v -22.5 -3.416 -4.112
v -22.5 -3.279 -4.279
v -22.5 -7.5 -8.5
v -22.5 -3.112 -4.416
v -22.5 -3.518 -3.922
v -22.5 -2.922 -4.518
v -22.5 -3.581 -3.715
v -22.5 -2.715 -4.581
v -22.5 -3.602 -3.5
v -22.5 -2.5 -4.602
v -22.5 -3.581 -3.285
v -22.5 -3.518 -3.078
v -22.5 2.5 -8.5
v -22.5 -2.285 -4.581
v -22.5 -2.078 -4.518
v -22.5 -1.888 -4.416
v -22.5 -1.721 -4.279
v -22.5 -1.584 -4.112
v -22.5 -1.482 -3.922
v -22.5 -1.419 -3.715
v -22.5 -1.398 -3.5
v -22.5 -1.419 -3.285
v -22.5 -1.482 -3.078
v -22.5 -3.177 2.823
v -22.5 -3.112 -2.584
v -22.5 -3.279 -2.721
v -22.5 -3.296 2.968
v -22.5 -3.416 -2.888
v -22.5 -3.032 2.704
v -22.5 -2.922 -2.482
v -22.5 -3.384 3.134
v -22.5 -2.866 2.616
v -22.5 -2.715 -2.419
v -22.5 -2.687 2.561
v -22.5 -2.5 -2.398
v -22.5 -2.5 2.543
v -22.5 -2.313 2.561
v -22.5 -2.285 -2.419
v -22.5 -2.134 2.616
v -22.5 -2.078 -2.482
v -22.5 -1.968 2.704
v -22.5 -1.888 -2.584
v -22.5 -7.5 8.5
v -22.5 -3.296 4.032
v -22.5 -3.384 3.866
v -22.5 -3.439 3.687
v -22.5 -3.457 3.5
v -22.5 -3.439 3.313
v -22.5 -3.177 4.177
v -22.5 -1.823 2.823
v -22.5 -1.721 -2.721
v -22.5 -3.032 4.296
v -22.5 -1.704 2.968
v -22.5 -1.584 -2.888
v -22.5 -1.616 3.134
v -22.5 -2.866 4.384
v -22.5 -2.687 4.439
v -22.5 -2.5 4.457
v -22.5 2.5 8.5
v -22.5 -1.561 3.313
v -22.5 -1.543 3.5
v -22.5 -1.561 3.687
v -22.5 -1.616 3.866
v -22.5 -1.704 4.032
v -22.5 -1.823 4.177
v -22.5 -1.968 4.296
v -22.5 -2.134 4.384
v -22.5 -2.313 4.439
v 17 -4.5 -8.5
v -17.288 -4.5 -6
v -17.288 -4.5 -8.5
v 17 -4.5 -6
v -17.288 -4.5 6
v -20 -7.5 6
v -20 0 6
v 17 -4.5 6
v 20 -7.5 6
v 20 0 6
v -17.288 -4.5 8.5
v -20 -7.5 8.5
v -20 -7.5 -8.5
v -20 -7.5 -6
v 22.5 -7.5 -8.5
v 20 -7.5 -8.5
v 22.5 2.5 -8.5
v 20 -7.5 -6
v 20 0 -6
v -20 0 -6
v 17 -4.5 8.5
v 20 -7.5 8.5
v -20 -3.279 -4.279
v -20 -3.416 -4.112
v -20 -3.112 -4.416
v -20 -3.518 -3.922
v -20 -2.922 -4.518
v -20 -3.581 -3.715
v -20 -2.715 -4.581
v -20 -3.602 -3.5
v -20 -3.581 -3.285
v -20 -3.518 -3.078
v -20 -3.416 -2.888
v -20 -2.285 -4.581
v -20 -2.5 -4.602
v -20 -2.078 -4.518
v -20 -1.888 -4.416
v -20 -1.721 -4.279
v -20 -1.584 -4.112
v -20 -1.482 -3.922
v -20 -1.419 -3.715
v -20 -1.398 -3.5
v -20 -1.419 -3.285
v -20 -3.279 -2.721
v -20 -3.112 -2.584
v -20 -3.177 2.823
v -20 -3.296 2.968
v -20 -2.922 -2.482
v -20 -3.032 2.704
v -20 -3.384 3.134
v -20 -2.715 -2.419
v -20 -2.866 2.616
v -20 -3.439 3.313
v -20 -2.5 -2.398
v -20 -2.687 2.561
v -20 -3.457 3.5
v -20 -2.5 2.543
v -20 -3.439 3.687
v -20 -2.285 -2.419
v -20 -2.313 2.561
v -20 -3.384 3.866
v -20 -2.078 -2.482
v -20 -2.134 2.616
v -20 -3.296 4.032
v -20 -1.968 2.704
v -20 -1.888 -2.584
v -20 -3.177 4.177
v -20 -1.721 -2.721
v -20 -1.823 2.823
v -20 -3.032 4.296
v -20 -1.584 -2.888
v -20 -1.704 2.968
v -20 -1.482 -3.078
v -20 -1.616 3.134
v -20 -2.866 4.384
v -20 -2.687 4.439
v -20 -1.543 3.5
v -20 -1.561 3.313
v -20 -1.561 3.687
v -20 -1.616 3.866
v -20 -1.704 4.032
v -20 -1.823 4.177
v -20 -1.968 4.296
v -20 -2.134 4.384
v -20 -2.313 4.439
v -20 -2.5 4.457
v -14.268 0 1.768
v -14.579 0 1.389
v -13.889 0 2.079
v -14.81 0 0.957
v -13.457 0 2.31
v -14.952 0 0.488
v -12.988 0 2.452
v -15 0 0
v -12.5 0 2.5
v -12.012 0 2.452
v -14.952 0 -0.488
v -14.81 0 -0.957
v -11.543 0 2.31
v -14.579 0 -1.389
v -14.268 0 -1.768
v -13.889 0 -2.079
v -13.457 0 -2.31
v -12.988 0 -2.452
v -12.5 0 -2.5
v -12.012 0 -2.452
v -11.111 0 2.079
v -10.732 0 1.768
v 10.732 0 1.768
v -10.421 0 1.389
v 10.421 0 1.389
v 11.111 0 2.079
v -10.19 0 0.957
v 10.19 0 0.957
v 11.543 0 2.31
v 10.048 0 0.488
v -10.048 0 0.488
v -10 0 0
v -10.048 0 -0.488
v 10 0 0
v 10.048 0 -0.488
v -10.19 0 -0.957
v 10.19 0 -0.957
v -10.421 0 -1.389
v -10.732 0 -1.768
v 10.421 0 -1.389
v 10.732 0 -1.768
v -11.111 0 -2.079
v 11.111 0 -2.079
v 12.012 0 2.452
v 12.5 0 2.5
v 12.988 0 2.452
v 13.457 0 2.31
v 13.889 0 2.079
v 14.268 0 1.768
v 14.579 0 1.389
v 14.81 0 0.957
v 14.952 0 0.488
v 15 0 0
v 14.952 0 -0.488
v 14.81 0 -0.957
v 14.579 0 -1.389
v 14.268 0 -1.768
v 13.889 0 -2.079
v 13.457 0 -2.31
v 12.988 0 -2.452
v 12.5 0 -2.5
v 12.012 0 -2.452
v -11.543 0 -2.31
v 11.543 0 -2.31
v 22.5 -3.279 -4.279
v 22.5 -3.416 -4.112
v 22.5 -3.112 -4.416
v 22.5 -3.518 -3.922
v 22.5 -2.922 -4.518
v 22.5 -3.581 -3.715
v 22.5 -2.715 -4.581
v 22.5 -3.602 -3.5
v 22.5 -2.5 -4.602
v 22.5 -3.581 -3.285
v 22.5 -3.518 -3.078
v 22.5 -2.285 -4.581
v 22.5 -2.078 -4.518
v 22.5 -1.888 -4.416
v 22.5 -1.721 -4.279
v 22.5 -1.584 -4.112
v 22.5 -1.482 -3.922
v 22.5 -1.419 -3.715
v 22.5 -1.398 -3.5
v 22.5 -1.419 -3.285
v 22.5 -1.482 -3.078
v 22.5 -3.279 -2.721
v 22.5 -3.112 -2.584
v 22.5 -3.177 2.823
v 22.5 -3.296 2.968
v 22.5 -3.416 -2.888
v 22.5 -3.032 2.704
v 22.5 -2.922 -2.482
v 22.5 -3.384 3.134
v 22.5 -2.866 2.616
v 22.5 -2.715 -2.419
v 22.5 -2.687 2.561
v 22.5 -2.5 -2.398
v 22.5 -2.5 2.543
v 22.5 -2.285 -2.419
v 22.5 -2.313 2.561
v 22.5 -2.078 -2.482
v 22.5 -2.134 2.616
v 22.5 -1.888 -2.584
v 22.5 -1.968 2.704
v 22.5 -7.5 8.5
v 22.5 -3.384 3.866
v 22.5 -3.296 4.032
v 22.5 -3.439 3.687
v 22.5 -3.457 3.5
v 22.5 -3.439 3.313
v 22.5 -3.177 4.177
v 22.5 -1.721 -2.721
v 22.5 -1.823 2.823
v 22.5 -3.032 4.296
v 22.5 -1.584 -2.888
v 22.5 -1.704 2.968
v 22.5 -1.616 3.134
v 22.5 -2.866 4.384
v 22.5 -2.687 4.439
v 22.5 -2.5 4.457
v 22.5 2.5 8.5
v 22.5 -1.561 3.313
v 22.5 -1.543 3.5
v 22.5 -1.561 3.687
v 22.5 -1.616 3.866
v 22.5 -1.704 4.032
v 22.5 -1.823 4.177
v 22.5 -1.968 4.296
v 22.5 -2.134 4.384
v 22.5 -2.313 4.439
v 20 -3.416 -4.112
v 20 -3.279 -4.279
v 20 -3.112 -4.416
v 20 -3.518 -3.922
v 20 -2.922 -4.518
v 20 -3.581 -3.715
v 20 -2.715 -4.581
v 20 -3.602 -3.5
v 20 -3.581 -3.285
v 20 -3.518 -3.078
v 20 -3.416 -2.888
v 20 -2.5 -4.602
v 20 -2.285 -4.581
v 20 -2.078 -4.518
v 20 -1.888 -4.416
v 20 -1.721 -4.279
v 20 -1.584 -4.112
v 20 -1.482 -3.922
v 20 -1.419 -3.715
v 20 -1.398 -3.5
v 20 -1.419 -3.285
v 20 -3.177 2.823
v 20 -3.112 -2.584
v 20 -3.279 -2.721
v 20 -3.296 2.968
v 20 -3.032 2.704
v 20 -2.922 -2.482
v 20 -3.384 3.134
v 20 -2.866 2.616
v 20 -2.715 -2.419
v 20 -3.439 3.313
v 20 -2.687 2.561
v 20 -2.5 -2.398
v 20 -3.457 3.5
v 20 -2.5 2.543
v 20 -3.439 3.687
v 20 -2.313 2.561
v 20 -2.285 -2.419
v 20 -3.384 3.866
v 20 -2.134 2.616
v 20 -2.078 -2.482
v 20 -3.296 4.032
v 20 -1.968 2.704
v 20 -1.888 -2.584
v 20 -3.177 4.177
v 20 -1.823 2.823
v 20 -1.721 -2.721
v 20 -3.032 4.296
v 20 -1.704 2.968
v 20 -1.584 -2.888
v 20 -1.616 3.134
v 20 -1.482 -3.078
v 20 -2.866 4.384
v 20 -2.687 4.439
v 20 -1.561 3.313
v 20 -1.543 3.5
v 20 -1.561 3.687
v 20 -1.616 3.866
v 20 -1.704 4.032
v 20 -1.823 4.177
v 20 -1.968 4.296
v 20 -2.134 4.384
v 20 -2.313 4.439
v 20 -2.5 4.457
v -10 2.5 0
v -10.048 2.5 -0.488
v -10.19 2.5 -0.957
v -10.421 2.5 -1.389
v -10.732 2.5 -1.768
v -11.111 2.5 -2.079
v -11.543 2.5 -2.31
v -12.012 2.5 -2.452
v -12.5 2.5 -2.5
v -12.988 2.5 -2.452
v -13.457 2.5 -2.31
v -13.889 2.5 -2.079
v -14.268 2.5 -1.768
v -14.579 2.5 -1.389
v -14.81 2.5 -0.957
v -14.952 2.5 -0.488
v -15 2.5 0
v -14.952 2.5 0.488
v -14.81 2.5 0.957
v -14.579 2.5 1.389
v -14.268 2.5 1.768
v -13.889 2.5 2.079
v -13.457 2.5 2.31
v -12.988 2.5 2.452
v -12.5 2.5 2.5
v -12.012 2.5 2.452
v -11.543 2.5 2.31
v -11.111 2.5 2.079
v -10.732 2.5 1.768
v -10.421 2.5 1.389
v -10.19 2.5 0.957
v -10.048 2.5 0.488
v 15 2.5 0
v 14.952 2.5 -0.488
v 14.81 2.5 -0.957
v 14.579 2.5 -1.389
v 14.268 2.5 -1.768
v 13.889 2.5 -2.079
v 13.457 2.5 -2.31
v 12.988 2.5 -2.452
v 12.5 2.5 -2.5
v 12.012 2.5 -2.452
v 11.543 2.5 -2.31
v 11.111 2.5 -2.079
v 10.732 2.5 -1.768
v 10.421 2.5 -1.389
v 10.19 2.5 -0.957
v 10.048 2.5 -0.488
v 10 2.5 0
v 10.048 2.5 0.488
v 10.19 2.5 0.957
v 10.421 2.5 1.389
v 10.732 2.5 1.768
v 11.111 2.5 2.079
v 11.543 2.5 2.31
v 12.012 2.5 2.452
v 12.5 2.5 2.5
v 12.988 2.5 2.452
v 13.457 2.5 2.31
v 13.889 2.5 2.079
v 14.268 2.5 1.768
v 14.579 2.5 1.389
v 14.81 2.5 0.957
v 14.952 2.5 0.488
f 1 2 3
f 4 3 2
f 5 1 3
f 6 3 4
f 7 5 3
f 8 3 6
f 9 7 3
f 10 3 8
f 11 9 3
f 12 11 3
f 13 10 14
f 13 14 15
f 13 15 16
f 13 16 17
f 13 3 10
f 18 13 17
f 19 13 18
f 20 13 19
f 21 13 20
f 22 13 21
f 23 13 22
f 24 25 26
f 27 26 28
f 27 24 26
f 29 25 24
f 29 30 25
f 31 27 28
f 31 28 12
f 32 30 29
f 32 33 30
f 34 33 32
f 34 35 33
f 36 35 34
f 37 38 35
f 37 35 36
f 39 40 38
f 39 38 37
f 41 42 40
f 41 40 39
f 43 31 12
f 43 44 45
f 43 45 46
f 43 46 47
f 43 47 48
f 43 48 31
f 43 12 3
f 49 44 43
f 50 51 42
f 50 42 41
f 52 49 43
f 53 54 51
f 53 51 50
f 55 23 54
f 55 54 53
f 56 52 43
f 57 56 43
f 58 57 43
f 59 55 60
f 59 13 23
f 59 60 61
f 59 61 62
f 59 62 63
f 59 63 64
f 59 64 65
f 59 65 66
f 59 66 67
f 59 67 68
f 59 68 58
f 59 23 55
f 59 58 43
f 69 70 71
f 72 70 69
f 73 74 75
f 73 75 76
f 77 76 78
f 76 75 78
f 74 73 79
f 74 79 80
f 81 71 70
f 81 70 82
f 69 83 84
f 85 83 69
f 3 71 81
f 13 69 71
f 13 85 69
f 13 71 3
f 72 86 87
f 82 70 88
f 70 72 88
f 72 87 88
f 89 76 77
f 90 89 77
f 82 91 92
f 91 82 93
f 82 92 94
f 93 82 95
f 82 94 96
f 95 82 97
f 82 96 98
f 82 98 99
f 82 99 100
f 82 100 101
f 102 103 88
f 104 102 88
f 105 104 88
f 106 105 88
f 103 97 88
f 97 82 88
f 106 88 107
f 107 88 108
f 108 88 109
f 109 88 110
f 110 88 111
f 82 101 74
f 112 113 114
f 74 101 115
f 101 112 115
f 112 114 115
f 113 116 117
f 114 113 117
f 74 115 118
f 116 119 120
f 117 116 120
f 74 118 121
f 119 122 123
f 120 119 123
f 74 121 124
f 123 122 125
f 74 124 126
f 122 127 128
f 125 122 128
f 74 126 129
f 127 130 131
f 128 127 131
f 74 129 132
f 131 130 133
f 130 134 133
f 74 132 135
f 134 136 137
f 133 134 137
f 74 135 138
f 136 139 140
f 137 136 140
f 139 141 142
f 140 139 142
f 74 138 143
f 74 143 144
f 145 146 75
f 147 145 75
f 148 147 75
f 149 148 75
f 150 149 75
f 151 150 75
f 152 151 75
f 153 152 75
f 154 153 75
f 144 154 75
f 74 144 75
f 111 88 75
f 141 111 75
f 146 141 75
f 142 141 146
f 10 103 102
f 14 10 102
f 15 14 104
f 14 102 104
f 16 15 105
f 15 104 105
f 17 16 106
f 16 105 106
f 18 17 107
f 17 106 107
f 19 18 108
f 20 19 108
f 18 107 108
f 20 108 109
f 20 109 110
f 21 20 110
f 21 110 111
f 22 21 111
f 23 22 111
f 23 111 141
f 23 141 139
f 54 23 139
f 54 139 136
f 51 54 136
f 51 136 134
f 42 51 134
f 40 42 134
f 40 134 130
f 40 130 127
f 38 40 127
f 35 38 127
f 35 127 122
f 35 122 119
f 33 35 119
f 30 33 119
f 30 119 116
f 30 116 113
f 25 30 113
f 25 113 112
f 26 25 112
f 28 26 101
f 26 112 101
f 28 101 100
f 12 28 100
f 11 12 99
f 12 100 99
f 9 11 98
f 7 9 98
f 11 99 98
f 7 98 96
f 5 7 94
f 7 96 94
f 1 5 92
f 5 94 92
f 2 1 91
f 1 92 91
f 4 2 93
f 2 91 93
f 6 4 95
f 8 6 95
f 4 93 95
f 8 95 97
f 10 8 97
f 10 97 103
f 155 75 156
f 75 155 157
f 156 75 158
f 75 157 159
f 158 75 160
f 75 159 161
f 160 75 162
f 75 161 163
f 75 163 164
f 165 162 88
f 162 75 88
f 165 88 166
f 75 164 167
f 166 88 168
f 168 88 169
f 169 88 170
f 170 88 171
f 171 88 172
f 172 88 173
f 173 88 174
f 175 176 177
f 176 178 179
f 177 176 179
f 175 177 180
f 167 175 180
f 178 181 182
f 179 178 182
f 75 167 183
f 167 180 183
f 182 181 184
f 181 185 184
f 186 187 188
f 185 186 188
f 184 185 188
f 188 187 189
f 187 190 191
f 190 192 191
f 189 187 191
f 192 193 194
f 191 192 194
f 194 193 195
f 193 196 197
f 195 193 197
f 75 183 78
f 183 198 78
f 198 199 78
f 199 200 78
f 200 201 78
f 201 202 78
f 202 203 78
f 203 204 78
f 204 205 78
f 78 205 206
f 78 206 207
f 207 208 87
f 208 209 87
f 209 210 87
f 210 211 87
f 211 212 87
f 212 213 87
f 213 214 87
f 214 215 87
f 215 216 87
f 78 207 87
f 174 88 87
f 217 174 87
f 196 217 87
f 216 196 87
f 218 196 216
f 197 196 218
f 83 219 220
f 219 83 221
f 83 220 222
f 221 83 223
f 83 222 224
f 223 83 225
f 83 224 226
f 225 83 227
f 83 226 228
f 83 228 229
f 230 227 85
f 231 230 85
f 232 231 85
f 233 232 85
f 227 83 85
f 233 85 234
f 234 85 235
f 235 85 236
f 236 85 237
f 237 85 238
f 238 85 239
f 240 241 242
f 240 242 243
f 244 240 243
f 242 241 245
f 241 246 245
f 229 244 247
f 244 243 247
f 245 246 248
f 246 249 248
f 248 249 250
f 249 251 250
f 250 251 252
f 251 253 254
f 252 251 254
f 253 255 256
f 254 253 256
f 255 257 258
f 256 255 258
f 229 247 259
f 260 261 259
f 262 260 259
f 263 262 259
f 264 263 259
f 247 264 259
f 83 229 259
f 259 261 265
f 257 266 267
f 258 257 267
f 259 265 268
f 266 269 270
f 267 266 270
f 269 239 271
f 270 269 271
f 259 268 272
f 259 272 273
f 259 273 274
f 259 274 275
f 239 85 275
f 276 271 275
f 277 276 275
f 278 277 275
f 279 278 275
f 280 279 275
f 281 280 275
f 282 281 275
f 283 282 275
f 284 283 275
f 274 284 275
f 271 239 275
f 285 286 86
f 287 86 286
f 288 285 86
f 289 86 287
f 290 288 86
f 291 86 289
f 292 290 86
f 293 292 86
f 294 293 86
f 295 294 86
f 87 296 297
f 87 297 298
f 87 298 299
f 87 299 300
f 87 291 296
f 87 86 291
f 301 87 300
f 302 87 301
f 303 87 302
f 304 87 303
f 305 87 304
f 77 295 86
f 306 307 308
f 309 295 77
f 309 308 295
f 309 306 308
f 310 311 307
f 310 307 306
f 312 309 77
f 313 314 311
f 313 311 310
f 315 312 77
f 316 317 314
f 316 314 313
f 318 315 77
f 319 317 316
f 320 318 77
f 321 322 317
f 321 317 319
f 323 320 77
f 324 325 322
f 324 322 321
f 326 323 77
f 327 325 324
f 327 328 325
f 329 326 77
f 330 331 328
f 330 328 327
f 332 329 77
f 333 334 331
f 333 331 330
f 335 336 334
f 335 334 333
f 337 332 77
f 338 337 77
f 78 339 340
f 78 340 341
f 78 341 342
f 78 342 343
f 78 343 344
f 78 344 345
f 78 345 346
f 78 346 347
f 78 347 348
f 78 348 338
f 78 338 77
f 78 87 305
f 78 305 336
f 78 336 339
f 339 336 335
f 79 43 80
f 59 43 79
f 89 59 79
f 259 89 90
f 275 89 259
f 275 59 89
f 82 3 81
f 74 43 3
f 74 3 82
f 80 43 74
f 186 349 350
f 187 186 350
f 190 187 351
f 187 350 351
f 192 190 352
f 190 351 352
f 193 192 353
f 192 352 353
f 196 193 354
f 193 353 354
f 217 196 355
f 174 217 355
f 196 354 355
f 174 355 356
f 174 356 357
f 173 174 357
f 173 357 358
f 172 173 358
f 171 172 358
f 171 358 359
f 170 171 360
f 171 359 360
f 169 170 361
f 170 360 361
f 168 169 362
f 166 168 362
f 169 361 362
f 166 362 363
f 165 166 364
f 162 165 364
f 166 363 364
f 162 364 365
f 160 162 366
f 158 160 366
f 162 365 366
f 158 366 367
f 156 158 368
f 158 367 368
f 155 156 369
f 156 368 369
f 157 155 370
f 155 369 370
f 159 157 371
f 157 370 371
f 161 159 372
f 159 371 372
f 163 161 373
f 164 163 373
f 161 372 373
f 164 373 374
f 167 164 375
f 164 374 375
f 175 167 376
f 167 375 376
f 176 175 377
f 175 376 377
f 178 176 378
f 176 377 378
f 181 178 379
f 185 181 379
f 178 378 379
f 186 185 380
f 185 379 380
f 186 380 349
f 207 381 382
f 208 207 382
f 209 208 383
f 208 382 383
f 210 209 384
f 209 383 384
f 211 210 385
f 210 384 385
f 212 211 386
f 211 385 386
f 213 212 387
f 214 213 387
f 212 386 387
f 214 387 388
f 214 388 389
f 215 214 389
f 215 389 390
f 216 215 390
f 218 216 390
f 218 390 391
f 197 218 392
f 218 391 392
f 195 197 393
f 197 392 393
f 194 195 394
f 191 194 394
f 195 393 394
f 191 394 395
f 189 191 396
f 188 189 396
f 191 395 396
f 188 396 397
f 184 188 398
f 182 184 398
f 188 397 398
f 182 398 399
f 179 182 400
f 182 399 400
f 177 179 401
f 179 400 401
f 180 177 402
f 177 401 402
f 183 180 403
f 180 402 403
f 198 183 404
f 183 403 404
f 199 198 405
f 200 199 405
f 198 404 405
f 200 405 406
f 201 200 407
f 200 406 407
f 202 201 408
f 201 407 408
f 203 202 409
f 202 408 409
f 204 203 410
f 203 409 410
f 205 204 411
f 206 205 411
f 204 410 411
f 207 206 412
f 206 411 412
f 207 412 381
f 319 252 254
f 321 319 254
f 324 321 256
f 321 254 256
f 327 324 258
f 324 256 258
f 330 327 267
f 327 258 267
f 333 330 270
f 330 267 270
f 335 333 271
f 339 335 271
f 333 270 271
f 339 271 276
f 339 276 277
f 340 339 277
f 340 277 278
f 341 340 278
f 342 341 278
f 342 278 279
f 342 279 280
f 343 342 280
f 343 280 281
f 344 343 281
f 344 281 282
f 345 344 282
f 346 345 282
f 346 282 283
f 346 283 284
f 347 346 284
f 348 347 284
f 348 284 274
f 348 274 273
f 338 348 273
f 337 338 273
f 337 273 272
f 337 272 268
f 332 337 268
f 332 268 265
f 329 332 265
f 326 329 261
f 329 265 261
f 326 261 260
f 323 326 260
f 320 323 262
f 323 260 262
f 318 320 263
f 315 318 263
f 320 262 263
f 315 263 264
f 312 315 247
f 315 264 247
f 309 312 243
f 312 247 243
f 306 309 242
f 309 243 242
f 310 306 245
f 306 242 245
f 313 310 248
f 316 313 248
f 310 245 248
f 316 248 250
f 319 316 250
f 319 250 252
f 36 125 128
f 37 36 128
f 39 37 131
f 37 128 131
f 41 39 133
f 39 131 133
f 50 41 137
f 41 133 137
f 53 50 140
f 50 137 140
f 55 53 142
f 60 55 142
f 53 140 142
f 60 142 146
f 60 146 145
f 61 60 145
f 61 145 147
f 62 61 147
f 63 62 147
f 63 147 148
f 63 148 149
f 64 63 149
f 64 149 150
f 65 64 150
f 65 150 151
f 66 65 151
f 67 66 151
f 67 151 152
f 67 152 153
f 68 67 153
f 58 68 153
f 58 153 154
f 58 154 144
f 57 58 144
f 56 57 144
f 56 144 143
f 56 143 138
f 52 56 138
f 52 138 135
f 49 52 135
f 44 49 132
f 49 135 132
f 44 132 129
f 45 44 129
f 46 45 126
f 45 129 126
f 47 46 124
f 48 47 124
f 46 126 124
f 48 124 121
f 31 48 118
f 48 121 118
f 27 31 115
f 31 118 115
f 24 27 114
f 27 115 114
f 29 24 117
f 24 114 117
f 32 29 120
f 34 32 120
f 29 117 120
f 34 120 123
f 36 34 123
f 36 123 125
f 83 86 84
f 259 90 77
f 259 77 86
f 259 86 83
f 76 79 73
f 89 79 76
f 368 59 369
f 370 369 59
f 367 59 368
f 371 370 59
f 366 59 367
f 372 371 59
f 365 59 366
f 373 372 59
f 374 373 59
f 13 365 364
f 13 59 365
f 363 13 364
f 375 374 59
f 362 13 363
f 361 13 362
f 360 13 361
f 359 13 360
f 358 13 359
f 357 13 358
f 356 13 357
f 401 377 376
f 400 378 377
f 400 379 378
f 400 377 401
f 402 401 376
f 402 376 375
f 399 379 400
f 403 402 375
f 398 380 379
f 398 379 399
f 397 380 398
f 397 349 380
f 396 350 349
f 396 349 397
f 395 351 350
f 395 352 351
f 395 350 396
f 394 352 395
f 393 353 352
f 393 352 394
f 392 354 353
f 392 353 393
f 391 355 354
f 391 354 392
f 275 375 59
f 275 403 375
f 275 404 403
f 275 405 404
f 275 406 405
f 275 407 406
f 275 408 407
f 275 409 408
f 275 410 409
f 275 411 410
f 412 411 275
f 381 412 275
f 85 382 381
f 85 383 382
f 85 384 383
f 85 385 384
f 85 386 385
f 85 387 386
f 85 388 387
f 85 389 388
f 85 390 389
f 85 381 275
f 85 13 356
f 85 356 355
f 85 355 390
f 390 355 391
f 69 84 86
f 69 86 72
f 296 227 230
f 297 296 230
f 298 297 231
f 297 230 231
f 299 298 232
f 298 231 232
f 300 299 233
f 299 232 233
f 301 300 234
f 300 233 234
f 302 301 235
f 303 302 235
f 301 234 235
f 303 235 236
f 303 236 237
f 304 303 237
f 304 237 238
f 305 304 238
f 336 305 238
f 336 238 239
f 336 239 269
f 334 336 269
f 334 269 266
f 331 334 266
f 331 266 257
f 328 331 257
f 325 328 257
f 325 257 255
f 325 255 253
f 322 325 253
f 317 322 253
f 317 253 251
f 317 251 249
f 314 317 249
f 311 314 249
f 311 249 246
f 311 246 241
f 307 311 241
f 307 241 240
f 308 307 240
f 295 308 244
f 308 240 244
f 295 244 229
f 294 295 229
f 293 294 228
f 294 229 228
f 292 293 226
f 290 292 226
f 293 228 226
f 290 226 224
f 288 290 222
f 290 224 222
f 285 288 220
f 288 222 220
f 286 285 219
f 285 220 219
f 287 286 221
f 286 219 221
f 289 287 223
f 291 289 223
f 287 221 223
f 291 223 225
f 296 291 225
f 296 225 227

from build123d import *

# Parameters (mm, degrees)
SKETCH1_W           = 45
SKETCH1_H           = 17
BOSS_EXTRUDE1_DEPTH = 2.5
SKETCH2_W           = 45
SKETCH2_H           = 17
SKETCH2_W_2         = 40
SKETCH2_H_2         = 12
BOSS_EXTRUDE2_DEPTH = 4.5
SKETCH3_R           = 0.957368162
SKETCH3_R_2         = 1.102212996
CUT_EXTRUDE1_DEPTH  = 46
SKETCH4_W           = 2.5
SKETCH4_H           = 17
BOSS_EXTRUDE3_DEPTH = 3
BOSS_EXTRUDE4_START = -2.5
BOSS_EXTRUDE4_DEPTH = 2.5
BOSS_EXTRUDE5_DEPTH = 2.5
SKETCH7_R           = 2.5
CUT_EXTRUDE2_DEPTH  = 2.5


with BuildPart() as part:
    # Sketch1 → Boss-Extrude1 (new body)
    with BuildSketch(Plane(origin=(0, 0, 0), x_dir=(1, 0, 0), z_dir=(0, 1, 0))):
        Rectangle(SKETCH1_W, SKETCH1_H)
    extrude(amount=BOSS_EXTRUDE1_DEPTH)

    # Sketch2 → Boss-Extrude2 (add)
    with BuildSketch(Plane.XZ):
        Rectangle(SKETCH2_W, SKETCH2_H)
        Rectangle(SKETCH2_W_2, SKETCH2_H_2, mode=Mode.SUBTRACT)
    extrude(amount=BOSS_EXTRUDE2_DEPTH)

    # Sketch3 → Cut-Extrude1 (cut, through all)
    with BuildSketch(Plane(origin=(22.5, 0, 0), x_dir=(0, 0, -1), z_dir=(1, 0, 0))):
        with Locations((-3.5, -2.5)):
            Circle(SKETCH3_R)
        with Locations((3.5, -2.5)):
            Circle(SKETCH3_R_2)
    extrude(amount=-CUT_EXTRUDE1_DEPTH, mode=Mode.SUBTRACT)

    # Sketch4 → Boss-Extrude3 (add)
    with BuildSketch(Plane.XZ.offset(4.5)):
        with Locations((-21.25, 0)):
            Rectangle(SKETCH4_W, SKETCH4_H)
        with Locations((21.25, 0)):
            Rectangle(SKETCH4_W, SKETCH4_H)
    extrude(amount=BOSS_EXTRUDE3_DEPTH)

    # Sketch5 → Boss-Extrude4 (add)
    with BuildSketch(Plane.XY.offset(8.5).offset(BOSS_EXTRUDE4_START)):
        Polygon((20, -7.5), (20, -4.5), (17, -4.5), align=None)
        Polygon((-20, -7.5), (-20, -4.5), (-17.287649909, -4.5), align=None)
    extrude(amount=BOSS_EXTRUDE4_DEPTH)

    # Sketch6 → Boss-Extrude5 (add)
    with BuildSketch(Plane(origin=(0, 0, -8.5), x_dir=(-1, 0, 0), z_dir=(0, 0, -1))):
        Polygon((20, -4.5), (17.287649909, -4.5), (20, -7.5), align=None)
        Polygon((-17, -4.5), (-20, -4.5), (-20, -7.5), align=None)
    extrude(amount=-BOSS_EXTRUDE5_DEPTH)

    # Sketch7 → Cut-Extrude2 (cut)
    with BuildSketch(Plane(origin=(0, 2.5, 0), x_dir=(1, 0, 0), z_dir=(0, 1, 0))):
        with Locations((-12.5, 0)):
            Circle(SKETCH7_R)
        with Locations((12.5, 0)):
            Circle(SKETCH7_R)
    cut_extrude2 = extrude(amount=-CUT_EXTRUDE2_DEPTH, mode=Mode.SUBTRACT)

    # Mirror1: Cut-Extrude2 across plane
    add(cut_extrude2.mirror(Plane.XY), mode=Mode.SUBTRACT)


solid = part.part
